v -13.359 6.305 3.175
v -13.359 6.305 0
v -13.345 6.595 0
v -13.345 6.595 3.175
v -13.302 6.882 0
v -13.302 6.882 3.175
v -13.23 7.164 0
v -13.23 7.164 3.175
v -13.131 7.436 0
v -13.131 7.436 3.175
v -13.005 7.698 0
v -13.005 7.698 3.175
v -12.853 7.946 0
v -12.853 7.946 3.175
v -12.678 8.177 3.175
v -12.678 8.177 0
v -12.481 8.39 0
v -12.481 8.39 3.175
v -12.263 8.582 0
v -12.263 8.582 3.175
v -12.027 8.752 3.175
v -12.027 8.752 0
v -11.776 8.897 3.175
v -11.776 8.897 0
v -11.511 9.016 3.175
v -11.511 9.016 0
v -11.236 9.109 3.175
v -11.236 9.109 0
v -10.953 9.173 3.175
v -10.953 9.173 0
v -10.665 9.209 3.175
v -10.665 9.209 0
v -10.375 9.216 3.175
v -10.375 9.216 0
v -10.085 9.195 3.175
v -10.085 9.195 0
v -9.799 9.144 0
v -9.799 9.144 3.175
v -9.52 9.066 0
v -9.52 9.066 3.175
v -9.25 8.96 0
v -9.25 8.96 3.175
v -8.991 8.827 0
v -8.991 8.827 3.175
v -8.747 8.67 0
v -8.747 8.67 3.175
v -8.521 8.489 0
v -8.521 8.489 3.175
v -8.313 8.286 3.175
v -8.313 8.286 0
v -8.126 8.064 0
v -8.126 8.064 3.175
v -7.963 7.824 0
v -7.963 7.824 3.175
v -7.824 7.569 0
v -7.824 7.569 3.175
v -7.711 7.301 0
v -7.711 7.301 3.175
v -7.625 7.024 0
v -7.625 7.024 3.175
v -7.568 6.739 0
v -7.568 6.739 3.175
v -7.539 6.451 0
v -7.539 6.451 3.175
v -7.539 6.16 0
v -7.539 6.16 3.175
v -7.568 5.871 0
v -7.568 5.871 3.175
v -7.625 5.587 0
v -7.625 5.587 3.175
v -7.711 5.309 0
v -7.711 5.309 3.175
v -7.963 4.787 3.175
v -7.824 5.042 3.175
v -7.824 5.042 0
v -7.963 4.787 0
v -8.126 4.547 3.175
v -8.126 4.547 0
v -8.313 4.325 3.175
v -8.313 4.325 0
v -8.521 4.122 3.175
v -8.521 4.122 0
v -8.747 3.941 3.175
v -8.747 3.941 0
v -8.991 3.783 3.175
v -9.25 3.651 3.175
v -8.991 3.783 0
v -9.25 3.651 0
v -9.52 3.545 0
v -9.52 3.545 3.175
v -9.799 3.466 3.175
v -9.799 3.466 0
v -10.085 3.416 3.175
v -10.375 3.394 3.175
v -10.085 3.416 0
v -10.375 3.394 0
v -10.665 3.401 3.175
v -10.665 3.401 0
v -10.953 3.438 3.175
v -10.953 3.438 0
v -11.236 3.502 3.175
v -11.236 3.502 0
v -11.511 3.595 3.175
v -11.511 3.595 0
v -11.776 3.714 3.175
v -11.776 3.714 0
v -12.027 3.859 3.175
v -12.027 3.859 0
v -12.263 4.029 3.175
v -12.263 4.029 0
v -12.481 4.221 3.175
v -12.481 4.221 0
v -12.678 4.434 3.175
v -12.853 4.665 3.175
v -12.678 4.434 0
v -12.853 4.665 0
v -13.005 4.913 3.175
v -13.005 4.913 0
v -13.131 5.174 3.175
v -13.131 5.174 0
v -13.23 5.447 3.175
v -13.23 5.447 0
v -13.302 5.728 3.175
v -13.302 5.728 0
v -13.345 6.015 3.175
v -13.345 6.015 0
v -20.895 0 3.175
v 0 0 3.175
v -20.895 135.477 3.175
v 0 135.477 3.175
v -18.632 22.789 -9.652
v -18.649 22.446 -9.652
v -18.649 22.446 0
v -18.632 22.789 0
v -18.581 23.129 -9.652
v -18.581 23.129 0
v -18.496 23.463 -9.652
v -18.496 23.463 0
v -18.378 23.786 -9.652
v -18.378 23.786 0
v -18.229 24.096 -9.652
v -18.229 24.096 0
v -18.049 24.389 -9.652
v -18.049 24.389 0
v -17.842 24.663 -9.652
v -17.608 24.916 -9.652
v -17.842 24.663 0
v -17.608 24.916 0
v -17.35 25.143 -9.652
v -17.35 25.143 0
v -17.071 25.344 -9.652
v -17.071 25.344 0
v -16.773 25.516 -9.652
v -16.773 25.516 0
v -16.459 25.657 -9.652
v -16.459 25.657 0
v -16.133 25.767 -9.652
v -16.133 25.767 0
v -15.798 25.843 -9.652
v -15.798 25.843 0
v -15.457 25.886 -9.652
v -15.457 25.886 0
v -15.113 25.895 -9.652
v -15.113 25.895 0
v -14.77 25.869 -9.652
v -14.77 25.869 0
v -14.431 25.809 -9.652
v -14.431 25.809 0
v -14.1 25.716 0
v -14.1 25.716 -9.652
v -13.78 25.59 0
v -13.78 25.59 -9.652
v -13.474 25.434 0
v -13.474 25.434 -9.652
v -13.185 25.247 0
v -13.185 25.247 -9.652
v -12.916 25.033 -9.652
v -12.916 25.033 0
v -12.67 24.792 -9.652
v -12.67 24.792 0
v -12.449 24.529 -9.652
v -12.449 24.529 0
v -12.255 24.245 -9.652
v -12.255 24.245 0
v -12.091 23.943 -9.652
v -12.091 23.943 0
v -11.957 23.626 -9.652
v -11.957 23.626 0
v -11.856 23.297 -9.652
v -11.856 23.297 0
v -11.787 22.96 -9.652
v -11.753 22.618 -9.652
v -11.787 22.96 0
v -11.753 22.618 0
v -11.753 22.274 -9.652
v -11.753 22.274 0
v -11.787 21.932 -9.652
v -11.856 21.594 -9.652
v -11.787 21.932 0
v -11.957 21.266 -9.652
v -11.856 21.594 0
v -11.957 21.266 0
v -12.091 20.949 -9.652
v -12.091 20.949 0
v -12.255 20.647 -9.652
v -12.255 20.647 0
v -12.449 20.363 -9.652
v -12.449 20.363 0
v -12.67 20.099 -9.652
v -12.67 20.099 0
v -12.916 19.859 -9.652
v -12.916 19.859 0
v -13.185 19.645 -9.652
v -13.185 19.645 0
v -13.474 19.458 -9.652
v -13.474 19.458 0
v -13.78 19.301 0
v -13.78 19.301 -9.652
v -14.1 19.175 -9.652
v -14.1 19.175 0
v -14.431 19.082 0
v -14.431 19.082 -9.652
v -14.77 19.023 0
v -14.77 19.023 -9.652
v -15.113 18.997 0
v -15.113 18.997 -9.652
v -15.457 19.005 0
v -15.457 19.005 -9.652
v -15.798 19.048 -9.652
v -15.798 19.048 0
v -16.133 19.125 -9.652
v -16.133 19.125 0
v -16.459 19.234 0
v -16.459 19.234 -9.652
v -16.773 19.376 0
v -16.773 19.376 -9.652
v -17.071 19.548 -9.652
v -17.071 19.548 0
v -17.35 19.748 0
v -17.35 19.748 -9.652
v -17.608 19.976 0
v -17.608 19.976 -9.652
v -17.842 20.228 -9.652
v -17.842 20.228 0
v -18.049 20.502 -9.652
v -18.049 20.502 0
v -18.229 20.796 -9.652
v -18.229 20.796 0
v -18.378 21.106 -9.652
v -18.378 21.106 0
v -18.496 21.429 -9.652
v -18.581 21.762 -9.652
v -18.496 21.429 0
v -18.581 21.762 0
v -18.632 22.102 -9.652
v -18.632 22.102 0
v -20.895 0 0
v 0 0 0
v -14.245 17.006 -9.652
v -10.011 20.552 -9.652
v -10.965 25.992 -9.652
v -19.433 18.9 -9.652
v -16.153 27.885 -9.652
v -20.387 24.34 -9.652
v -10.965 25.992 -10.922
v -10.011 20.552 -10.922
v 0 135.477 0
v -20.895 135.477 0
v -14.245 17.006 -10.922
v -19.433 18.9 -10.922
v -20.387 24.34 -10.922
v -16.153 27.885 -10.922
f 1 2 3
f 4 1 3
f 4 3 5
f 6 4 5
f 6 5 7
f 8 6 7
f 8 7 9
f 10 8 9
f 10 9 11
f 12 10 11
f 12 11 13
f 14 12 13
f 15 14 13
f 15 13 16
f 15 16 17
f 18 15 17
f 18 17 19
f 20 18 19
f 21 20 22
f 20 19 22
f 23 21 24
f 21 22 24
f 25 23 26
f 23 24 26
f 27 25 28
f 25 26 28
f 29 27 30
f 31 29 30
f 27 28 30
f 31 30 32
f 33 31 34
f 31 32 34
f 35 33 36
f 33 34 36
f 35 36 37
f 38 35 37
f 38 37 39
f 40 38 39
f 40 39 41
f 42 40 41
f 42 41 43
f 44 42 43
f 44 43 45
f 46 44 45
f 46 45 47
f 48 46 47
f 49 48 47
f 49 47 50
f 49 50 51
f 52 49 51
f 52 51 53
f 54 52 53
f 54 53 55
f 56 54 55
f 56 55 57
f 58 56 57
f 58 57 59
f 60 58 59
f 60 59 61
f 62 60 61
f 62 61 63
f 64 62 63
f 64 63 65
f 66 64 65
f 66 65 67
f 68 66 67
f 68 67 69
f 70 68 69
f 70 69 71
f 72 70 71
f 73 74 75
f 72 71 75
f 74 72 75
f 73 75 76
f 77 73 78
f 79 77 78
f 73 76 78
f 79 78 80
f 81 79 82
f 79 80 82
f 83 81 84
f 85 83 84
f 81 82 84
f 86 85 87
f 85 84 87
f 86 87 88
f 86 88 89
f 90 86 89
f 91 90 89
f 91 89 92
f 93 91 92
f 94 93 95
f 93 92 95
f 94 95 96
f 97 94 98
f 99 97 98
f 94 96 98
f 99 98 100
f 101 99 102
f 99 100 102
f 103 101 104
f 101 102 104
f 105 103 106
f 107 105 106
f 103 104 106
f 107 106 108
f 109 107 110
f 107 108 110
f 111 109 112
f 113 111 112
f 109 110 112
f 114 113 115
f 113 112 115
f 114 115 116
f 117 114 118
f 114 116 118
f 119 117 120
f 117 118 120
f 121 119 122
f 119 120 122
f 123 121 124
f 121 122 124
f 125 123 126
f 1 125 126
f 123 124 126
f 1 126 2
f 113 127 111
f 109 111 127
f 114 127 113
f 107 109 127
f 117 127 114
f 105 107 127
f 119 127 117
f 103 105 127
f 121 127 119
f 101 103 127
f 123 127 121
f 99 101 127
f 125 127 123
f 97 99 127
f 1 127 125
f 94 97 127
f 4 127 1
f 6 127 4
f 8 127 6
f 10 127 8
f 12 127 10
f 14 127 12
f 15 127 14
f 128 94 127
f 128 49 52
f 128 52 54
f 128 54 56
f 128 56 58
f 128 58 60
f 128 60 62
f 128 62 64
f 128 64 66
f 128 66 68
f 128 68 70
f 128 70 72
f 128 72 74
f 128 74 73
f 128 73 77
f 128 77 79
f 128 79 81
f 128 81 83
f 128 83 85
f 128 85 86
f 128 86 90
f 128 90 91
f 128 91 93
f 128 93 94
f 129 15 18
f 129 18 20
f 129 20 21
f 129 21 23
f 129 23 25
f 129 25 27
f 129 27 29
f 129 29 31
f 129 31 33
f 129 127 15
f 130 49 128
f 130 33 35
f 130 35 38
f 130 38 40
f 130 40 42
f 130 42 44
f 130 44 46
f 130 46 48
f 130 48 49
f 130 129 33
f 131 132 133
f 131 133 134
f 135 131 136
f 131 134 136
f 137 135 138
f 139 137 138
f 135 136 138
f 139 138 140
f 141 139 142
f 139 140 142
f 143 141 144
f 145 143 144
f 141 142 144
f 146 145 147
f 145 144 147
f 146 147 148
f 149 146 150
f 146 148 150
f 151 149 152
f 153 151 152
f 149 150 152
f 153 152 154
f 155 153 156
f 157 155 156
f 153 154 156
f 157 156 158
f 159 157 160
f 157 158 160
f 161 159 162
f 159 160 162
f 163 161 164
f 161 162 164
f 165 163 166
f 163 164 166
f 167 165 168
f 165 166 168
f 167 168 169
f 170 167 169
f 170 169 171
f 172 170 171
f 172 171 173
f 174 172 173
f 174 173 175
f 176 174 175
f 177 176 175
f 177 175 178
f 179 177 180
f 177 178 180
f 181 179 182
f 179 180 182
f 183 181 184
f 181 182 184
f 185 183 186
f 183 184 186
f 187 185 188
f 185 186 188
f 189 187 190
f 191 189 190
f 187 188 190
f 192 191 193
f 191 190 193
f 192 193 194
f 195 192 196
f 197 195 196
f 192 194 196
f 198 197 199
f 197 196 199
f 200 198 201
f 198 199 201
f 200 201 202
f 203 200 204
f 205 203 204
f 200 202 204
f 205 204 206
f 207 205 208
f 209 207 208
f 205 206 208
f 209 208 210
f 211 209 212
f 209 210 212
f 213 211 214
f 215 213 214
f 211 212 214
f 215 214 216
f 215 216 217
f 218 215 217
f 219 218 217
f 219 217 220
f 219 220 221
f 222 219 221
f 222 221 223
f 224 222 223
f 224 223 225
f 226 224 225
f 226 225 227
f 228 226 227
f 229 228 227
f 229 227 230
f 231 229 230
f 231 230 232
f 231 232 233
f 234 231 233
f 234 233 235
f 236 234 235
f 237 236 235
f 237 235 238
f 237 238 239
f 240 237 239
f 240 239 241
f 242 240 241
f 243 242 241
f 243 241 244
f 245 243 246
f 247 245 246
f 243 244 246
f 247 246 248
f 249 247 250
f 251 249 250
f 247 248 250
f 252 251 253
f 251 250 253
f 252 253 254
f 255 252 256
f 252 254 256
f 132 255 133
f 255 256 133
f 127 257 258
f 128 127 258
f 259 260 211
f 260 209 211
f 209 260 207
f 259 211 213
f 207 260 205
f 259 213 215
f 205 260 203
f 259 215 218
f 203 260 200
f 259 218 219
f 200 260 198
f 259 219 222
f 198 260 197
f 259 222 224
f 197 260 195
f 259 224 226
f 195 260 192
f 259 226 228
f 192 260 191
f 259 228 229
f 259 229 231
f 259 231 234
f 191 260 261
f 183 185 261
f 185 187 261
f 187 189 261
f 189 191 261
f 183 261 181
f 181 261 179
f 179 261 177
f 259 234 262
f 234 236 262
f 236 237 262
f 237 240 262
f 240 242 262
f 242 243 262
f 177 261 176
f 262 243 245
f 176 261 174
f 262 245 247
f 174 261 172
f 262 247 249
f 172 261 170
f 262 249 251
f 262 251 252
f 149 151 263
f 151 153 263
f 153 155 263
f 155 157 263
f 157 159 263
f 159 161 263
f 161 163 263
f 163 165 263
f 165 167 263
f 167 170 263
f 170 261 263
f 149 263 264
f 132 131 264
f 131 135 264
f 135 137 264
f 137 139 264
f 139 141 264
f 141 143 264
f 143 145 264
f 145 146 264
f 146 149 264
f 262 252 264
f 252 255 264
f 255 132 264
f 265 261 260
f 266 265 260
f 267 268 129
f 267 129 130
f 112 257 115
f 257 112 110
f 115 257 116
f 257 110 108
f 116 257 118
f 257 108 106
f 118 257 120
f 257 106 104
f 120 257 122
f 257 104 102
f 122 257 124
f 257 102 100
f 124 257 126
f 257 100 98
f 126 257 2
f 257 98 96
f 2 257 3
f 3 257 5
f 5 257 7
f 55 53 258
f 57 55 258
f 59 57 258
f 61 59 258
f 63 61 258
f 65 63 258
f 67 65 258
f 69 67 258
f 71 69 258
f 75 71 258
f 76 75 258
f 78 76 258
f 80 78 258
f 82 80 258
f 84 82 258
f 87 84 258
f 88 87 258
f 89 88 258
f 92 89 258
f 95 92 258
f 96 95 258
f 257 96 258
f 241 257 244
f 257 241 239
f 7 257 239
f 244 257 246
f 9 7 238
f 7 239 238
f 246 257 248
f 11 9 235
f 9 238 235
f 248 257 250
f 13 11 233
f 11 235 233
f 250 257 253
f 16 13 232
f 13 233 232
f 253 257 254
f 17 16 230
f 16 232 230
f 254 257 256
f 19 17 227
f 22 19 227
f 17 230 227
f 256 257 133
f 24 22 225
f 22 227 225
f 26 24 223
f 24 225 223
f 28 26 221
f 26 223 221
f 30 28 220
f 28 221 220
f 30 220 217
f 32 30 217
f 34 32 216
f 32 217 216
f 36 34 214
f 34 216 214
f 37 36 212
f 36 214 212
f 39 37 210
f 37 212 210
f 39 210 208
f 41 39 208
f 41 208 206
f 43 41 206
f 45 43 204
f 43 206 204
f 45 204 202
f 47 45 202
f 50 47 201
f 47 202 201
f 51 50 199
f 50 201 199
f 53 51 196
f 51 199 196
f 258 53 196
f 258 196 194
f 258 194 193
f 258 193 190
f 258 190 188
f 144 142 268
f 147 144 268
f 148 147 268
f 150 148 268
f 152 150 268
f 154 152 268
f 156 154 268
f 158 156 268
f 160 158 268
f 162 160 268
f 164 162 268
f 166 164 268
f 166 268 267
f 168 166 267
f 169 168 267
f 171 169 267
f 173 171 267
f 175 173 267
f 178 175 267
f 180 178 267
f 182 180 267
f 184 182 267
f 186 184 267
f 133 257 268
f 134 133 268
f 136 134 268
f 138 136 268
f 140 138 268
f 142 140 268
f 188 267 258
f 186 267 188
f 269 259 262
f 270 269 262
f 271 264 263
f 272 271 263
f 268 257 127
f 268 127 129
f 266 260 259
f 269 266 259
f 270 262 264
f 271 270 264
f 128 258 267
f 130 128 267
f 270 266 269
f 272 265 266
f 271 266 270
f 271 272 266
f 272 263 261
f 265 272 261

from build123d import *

# Parameters (mm, degrees)
SKETCH1_W               = 20.894747592
SKETCH1_H               = 135.476524453
BOSS_EXTRUDE1_DEPTH     = 3.175
SKETCH2_R               = 2.912030795
CUT_EXTRUDE2_DEPTH      = 1
CUT_EXTRUDE2_DEPTH_BACK = 4.175
SKETCH2_4_R             = 3.450024598
BOSS_EXTRUDE2_DEPTH     = 9.652
BOSS_EXTRUDE3_DEPTH     = 1.27


with BuildPart() as part:
    # Sketch1 → Boss-Extrude1 (new body)
    with BuildSketch(Plane.XY):
        with Locations((-10.447373796, 67.738262226)):
            Rectangle(SKETCH1_W, SKETCH1_H)
    extrude(amount=BOSS_EXTRUDE1_DEPTH)

    # Sketch2 → Cut-Extrude2 (cut, two sides)
    with BuildSketch(Plane(origin=(0, 0, 0), x_dir=(-1, 0, 0), z_dir=(0, 0, -1))) as cut_extrude2_sk:
        with Locations((10.447373796, 6.305347679)):
            Circle(SKETCH2_R)
    extrude(amount=CUT_EXTRUDE2_DEPTH, mode=Mode.SUBTRACT)
    extrude(cut_extrude2_sk.sketch, amount=-CUT_EXTRUDE2_DEPTH_BACK, mode=Mode.SUBTRACT)

    # Sketch2<4> → Boss-Extrude2 (add)
    with BuildSketch(Plane(origin=(0, 0, 0), x_dir=(-1, 0, 0), z_dir=(0, 0, -1))):
        with Locations((15.198897526, 22.445779357)):
            Circle(SKETCH2_4_R)
    extrude(amount=BOSS_EXTRUDE2_DEPTH)

    # Sketch3 → Boss-Extrude3 (add)
    with BuildSketch(Plane(origin=(0, 0, -9.652), x_dir=(-1, 0, 0), z_dir=(0, 0, -1))):
        Polygon((10.964889393, 25.99164554), (10.011083267, 20.551953845), (14.2450914, 17.006087662), (19.432905659, 18.899913174), (20.386711785, 24.339604868), (16.152703653, 27.885471051), align=None)
    extrude(amount=BOSS_EXTRUDE3_DEPTH)


solid = part.part
